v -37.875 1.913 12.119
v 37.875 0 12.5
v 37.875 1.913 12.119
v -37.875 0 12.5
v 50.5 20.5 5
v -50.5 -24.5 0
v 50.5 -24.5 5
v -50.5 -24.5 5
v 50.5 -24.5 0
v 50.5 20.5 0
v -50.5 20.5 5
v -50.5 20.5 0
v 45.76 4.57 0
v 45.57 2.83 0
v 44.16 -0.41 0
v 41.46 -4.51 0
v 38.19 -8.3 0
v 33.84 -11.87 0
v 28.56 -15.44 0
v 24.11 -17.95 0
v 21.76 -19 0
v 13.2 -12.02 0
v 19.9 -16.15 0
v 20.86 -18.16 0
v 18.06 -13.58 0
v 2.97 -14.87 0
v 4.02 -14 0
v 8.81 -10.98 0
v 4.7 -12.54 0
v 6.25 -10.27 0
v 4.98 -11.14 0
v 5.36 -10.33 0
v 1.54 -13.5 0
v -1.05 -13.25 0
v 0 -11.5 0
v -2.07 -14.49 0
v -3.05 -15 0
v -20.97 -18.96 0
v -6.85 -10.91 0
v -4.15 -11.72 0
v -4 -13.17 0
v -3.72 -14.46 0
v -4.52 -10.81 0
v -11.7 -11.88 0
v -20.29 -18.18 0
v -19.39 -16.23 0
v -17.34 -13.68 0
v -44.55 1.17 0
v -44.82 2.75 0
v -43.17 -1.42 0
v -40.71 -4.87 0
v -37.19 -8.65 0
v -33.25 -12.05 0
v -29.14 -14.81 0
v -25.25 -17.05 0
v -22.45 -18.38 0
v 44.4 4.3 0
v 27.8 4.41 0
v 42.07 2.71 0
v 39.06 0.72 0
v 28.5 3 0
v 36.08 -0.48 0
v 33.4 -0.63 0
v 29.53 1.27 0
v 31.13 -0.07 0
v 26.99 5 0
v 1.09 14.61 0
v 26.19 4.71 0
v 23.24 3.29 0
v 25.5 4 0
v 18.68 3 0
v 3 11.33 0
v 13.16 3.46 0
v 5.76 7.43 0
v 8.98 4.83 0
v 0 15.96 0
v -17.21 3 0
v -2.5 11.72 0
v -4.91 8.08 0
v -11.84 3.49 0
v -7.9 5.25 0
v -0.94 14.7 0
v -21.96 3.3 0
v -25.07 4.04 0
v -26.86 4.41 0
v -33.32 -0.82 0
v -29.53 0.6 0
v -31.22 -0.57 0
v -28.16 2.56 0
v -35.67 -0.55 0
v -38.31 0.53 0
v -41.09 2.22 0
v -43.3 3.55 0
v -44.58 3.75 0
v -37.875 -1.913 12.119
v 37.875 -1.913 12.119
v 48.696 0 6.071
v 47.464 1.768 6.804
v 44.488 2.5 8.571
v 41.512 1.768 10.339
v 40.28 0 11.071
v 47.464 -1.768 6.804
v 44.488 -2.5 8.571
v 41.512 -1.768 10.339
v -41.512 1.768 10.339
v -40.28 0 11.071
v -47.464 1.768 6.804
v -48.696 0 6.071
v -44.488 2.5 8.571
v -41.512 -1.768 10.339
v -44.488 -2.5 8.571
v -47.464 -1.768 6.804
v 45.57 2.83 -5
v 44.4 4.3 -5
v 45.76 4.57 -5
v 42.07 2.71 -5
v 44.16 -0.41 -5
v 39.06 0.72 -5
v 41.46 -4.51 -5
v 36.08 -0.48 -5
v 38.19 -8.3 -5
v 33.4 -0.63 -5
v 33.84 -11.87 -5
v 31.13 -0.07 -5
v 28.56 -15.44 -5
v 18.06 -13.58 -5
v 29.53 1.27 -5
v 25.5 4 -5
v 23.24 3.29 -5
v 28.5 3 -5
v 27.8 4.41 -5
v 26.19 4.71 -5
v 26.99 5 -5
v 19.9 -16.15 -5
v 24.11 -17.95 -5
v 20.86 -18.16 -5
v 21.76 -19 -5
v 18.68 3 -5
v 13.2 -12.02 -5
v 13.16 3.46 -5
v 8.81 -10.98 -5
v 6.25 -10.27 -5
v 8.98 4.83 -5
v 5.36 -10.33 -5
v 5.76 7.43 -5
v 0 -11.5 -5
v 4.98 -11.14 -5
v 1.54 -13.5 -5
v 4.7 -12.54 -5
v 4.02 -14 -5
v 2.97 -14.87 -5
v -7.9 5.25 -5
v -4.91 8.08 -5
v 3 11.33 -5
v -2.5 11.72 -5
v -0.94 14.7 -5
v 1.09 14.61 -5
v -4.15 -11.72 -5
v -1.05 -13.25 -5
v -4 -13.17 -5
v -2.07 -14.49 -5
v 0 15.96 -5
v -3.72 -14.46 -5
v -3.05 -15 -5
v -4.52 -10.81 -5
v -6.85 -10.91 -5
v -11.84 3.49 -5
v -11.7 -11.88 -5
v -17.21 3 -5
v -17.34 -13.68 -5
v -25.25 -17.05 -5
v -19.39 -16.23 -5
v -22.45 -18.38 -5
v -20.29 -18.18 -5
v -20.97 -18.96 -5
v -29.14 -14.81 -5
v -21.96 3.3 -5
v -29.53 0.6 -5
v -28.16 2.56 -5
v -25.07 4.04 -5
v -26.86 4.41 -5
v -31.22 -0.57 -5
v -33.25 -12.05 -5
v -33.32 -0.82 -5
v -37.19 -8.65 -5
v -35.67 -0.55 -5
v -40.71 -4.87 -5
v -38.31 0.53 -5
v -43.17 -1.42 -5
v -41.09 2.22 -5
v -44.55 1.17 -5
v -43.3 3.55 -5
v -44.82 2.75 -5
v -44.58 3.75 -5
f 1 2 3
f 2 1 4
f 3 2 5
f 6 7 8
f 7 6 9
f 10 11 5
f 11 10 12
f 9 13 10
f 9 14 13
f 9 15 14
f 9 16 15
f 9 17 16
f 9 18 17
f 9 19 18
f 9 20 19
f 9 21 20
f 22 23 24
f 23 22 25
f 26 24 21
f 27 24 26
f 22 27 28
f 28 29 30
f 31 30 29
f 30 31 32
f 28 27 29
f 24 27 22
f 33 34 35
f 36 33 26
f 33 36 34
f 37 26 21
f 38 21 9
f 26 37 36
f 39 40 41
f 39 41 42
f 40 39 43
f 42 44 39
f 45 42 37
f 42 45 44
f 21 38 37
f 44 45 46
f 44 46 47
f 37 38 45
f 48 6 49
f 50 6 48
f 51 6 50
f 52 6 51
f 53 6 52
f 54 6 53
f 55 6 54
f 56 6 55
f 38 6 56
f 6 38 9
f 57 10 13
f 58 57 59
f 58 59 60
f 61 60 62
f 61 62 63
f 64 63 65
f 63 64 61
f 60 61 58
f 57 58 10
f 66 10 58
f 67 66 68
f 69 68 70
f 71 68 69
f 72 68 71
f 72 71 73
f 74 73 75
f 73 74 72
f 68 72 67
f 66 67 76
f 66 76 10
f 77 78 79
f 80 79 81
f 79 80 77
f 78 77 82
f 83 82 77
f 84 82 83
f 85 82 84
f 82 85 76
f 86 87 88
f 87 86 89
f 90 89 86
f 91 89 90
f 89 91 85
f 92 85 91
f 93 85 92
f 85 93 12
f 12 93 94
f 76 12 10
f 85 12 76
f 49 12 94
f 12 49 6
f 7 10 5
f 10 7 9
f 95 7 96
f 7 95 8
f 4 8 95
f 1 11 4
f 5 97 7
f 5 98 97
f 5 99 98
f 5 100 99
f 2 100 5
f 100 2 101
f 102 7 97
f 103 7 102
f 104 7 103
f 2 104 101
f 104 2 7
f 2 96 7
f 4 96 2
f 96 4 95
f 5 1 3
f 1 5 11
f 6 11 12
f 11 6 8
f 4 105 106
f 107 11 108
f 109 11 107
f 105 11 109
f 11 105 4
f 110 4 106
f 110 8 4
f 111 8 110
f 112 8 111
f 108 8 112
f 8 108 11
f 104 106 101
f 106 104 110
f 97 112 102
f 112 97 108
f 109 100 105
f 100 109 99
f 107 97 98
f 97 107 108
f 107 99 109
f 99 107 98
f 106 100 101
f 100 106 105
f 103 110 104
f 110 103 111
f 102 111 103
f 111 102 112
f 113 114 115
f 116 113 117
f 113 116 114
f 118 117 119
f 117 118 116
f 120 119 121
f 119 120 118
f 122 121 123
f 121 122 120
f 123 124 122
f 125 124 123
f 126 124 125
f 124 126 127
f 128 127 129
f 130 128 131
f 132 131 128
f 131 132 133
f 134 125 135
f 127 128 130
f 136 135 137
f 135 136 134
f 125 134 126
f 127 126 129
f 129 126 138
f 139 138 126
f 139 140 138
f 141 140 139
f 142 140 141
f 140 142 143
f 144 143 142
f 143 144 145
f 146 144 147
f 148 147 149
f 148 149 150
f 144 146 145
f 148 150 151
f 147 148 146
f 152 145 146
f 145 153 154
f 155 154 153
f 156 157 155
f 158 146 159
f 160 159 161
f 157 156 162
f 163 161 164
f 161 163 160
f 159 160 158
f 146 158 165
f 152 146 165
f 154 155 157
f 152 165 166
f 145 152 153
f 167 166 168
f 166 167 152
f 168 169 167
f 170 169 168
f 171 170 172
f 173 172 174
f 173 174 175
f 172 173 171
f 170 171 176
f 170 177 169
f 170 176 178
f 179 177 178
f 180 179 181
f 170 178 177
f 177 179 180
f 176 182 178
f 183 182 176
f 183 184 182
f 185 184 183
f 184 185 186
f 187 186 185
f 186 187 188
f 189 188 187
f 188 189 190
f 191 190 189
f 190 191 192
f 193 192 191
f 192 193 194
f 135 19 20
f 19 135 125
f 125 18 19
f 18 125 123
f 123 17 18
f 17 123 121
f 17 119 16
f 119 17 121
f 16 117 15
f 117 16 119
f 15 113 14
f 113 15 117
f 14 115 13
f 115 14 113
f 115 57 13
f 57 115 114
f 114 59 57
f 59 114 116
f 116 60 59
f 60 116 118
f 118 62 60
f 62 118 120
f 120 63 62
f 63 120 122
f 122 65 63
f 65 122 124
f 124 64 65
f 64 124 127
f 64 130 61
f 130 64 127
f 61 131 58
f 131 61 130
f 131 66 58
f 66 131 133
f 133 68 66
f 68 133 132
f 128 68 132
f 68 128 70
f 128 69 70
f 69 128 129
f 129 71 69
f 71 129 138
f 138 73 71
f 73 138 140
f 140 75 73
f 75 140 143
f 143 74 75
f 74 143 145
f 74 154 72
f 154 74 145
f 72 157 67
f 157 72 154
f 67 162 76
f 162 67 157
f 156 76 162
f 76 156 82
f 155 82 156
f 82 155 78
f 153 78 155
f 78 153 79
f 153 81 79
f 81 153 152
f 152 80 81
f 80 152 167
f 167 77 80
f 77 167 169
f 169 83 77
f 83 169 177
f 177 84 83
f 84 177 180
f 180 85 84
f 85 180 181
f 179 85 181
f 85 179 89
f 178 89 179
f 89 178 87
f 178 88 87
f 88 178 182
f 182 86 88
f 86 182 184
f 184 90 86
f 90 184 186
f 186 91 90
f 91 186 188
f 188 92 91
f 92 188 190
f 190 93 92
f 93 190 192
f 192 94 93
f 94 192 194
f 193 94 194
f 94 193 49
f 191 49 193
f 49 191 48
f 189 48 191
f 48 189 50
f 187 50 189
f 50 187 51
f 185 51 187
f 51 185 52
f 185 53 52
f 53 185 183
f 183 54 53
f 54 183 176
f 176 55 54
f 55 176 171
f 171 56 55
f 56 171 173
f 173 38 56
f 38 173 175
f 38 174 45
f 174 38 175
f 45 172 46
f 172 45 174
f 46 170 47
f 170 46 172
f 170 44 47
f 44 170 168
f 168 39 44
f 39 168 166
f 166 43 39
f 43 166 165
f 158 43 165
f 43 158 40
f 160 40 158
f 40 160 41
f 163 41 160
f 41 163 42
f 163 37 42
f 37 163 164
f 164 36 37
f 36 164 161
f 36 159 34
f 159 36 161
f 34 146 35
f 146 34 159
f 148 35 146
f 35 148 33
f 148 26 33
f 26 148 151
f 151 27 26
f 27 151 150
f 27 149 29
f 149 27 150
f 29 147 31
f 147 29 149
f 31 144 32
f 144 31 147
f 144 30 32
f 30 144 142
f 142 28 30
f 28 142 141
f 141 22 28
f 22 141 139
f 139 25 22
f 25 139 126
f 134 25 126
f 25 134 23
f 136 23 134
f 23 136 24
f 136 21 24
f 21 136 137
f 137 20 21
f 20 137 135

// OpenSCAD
//input from http://chaaawa.com/stencil_factory_js/
input = "no_input";
//The size of the border arround the image (0 is no boarder)
boarder = 0; //[100]
//how much extra to add to the base shape, to allow for pointy or unusual images
comp_size = 10;//[100]
//xposition compensation
xcomp=0;
//yposition compensation
ycomp=-2;
//size of lace loop
loop_size = 5;
//the shape of the badge (including boarder)
shape = 0 ;// [180:Round, 360:Smooth, 4:Diamond, 5:Pentagon, 6:Hexagon, 7:Heptagon, 8:Octagon, 9:Nonagon, 10:Decagon, 11:Hendecagon, 12:Dodecagon,0:Square]

points_array = (input=="no_input"?  [[91,35],[[179.03,131.04],[177.55,131.62],[174.75,132.95],[170.86,135.19],[166.75,137.95],[162.81,141.35],[159.29,145.13],[156.83,148.58],[155.45,151.17],[155.18,152.75],[155.42,153.75],[156.7,153.55],[158.91,152.22],[161.69,150.53],[164.33,149.45],[166.68,149.18],[168.78,149.43],[170.47,150.6],[171.84,152.56],[173.14,154.41],[174.93,154.04],[178.04,153.3],[182.79,153],[188.16,153.49],[192.1,155.25],[195.09,158.08],[197.5,161.72],[199.06,164.7],[200,165.96],[201.09,164.61],[203,161.33],[205.76,157.43],[208.98,154.83],[213.16,153.46],[218.68,153],[223.24,153.29],[225.5,154],[226.19,154.71],[226.99,155],[227.8,154.41],[228.5,153],[229.53,151.27],[231.13,149.93],[233.4,149.37],[236.08,149.52],[239.06,150.72],[242.07,152.71],[244.4,154.3],[245.76,154.57],[245.57,152.83],[244.16,149.59],[241.46,145.49],[238.19,141.7],[233.84,138.13],[228.56,134.56],[224.11,132.05],[221.76,131],[220.86,131.84],[219.9,133.85],[218.06,136.42],[213.2,137.98],[208.81,139.02],[206.25,139.73],[205.36,139.67],[204.98,138.86],[204.7,137.46],[204.02,136],[202.97,135.13],[201.54,136.5],[200,138.5],[198.95,136.75],[197.93,135.51],[196.95,135],[196.28,135.54],[196,136.83],[195.85,138.28],[195.48,139.19],[193.15,139.09],[188.3,138.12],[182.66,136.32],[180.61,133.77],[179.71,131.82],[179.03,131.04]]]: input);

dispo_width = boarder*2;
badge_height = 10;
  
module logo(){
    translate([-400/2, -300/2, -badge_height/2]){
        for (i = [1:len(points_array) -1] ) {
            linear_extrude(height=badge_height/2)
            {
                polygon(points_array[i]);
            }
        }
    }
}

module back(){
    swidth = input_width+comp_size+boarder;
    sheight = input_height+comp_size+boarder;
    if (shape!= 0){
        translate([xcomp,xcomp,0]){
            scale([swidth,sheight,1]){
                cylinder(d=1,h=badge_height/2,$fn=shape);
            }
        }
    } else {
        translate([xcomp,ycomp,badge_height/4]){
            cube([swidth,sheight,badge_height/2],center=true);
        }
    }
}
module loop(){
    swidth = input_width+comp_size;
    translate([0,0,(badge_height+loop_size)/2]){
        rotate([0,90,0]){
            cylinder(d=loop_size+5,h=swidth*0.75, center=true);
        }
    }
}
module add_boarder(){
    swidth = input_width+comp_size;
    sheight = input_height+comp_size;
    
    if (shape!= 0){
        translate([xcomp,xcomp,-badge_height/2]){
            difference(){
                scale([swidth+boarder,sheight+boarder,1]){
                    cylinder(d=1,h=badge_height/2,$fn=shape);
                }
                scale([swidth,sheight,1]){
                    cylinder(d=1,h=badge_height/2,$fn=shape);
                }
            }
        }
    } else {
        translate([xcomp,ycomp,-badge_height/4]){
            difference(){
                cube([swidth+boarder,sheight+boarder,badge_height/2],center=true);
                cube([swidth,sheight,badge_height/2],center=true);
            }
        }
    }
}

module badge(){
    color("gray"){
        logo();
    }
    difference(){   
        hull(){
            back();
            loop();
        }
        translate([0,0,(badge_height+loop_size)/1.75]){
            rotate([0,90,0]){
                cylinder(d=loop_size,h=(input_width+comp_size)*2, center=true);
            }
        }
    }
    if (boarder>0){
        add_boarder();
    }
}
input_width = points_array[0][0];
input_height= points_array[0][1];
badge();
